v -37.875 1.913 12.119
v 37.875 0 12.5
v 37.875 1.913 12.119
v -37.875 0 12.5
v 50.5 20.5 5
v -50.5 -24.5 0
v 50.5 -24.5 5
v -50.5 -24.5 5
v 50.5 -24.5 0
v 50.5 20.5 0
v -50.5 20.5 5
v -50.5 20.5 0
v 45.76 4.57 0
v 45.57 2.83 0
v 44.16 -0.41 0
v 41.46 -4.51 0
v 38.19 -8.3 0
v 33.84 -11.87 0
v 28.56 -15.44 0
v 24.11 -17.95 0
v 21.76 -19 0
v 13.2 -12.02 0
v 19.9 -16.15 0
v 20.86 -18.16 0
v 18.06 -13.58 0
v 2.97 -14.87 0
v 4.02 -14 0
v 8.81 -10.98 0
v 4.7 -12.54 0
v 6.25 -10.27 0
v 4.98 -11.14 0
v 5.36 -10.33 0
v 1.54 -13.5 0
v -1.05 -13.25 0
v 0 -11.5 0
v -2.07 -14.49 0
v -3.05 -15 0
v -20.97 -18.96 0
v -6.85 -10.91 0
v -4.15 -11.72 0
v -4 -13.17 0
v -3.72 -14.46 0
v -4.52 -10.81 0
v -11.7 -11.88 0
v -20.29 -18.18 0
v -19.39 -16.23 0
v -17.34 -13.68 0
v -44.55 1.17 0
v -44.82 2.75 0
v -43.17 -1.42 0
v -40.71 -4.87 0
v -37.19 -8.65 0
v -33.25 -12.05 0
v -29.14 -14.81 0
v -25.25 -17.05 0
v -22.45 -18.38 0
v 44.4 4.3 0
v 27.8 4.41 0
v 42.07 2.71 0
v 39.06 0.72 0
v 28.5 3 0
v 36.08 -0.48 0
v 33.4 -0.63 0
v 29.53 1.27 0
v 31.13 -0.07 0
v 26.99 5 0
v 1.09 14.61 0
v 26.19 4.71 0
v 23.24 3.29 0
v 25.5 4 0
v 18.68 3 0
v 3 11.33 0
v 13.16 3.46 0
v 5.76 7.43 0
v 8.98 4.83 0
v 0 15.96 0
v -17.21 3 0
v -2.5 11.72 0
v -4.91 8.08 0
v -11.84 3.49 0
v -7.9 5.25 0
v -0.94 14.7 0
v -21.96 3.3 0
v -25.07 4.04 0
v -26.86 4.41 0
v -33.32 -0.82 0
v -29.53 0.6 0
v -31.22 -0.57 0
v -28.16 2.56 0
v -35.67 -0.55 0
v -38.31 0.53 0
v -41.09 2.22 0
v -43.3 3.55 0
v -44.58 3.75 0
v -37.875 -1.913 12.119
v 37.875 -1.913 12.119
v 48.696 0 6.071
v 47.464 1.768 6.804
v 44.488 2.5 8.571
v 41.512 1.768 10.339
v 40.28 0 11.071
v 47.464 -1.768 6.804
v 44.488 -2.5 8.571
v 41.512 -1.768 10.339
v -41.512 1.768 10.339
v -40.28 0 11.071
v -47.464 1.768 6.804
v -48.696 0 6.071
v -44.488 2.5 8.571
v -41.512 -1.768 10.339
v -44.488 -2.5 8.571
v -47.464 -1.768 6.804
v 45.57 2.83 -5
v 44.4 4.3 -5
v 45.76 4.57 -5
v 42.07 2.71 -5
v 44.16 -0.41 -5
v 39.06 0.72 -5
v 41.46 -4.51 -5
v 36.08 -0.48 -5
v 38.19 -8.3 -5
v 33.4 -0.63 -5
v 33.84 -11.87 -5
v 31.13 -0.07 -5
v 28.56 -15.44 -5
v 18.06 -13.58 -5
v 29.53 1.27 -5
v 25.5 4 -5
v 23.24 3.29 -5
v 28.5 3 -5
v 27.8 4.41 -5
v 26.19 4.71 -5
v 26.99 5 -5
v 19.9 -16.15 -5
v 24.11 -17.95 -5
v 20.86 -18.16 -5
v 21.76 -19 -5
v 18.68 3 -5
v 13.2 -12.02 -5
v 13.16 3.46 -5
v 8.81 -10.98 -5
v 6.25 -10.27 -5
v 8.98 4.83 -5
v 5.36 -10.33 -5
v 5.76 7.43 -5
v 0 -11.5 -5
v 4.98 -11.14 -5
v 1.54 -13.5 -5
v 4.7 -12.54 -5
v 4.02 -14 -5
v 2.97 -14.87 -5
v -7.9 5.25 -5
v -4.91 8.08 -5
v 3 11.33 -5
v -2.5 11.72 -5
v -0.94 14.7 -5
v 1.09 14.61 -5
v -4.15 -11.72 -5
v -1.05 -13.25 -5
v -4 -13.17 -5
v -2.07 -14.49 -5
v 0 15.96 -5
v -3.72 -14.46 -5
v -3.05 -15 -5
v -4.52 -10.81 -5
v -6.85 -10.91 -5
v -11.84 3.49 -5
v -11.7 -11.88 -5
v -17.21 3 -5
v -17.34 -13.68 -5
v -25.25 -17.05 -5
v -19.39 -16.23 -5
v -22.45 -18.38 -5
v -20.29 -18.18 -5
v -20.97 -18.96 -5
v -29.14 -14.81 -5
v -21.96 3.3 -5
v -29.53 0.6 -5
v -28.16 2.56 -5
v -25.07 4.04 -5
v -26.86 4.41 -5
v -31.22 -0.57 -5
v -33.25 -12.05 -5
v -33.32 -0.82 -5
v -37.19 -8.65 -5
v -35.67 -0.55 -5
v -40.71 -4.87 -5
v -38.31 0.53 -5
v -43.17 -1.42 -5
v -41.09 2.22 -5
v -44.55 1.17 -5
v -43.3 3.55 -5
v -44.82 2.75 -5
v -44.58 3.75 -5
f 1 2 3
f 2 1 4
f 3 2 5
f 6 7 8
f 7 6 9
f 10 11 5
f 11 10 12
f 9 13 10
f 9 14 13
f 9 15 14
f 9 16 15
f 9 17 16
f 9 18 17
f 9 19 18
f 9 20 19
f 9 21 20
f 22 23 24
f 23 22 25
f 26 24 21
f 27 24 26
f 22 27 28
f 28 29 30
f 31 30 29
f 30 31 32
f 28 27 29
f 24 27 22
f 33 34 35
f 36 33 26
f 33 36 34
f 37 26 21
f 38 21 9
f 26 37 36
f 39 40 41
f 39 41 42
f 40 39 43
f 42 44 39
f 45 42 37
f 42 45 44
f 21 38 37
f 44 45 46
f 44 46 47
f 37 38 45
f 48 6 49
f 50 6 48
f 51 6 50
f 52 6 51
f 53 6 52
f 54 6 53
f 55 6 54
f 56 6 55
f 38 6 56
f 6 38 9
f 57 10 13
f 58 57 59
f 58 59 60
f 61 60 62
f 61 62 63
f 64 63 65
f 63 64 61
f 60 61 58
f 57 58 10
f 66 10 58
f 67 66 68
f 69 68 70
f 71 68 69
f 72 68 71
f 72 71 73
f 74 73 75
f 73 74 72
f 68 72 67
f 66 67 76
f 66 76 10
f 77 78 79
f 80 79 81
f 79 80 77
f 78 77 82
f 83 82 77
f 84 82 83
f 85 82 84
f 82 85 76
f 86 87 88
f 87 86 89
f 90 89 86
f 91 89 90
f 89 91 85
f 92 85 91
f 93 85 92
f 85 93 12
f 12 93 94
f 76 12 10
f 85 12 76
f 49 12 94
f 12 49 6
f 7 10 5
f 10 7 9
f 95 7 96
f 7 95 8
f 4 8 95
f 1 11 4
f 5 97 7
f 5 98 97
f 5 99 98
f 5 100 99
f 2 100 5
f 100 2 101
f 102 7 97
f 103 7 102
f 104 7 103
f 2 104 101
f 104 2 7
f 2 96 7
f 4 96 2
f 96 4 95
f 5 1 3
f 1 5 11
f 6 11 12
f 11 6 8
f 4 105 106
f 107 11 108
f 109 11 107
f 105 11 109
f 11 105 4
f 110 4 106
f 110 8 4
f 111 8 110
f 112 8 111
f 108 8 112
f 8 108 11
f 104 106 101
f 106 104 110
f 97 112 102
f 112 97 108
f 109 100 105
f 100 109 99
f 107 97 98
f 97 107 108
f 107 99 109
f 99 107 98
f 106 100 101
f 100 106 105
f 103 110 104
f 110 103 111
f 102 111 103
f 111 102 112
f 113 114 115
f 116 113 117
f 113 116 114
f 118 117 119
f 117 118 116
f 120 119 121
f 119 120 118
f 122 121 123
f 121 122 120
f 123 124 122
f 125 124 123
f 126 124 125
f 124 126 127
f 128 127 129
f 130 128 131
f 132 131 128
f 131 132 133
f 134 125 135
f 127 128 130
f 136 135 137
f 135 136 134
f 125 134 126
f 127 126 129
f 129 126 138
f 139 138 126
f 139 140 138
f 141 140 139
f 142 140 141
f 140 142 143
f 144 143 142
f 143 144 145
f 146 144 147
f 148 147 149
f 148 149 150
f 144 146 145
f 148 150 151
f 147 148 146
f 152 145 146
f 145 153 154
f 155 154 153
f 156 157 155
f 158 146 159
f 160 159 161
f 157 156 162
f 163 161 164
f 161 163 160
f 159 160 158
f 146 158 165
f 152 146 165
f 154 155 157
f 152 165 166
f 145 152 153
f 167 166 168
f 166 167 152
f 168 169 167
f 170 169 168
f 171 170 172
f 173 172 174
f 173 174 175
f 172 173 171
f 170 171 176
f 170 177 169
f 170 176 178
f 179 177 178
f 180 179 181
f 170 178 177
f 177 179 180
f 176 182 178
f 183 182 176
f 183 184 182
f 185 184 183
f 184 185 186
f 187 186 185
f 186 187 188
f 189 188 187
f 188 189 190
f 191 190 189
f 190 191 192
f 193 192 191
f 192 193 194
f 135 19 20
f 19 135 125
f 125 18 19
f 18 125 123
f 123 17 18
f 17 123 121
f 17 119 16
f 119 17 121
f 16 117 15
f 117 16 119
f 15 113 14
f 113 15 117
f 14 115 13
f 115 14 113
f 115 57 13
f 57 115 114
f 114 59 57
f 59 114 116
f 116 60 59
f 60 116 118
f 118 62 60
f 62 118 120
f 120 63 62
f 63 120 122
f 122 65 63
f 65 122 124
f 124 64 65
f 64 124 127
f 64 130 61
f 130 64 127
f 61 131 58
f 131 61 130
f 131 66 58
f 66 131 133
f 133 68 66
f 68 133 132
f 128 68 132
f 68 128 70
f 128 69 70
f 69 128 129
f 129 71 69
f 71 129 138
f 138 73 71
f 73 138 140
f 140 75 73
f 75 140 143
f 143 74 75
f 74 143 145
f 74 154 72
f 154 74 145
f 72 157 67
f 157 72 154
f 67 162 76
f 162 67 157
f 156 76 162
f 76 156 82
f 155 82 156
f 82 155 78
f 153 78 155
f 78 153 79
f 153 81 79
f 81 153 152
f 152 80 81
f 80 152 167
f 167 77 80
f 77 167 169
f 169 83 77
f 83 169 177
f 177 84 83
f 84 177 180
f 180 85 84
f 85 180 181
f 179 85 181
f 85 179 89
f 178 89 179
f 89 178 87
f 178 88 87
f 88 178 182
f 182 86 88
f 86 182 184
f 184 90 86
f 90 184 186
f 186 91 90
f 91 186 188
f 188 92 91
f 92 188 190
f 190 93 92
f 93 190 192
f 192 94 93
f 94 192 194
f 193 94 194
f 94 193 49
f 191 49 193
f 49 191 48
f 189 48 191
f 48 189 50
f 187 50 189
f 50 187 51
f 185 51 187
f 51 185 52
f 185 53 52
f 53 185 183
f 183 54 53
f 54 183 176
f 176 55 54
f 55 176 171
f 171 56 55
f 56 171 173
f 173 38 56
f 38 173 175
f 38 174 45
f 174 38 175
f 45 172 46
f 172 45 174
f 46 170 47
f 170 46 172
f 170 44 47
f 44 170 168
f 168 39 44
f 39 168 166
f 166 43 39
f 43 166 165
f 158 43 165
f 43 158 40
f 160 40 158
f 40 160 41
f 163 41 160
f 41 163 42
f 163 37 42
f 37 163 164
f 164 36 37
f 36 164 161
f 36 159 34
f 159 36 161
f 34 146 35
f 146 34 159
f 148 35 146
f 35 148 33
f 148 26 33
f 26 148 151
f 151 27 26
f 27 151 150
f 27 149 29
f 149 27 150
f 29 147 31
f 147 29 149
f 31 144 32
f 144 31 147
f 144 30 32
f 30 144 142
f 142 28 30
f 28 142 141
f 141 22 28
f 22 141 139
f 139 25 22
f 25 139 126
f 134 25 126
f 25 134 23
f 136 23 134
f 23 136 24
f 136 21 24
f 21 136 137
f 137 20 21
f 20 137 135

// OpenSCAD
//input from http://chaaawa.com/stencil_factory_js/
input = "no_input";
//The size of the border arround the image (0 is no boarder)
boarder = 0; //[100]
//how much extra to add to the base shape, to allow for pointy or unusual images
comp_size = 10;//[100]
//xposition compensation
xcomp=0;
//yposition compensation
ycomp=-2;
//size of lace loop
loop_size = 5;
//the shape of the badge (including boarder)
shape = 0 ;// [180:Round, 360:Smooth, 4:Diamond, 5:Pentagon, 6:Hexagon, 7:Heptagon, 8:Octagon, 9:Nonagon, 10:Decagon, 11:Hendecagon, 12:Dodecagon,0:Square]

points_array = (input=="no_input"?  [[91,35],[[179.03,131.04],[177.55,131.62],[174.75,132.95],[170.86,135.19],[166.75,137.95],[162.81,141.35],[159.29,145.13],[156.83,148.58],[155.45,151.17],[155.18,152.75],[155.42,153.75],[156.7,153.55],[158.91,152.22],[161.69,150.53],[164.33,149.45],[166.68,149.18],[168.78,149.43],[170.47,150.6],[171.84,152.56],[173.14,154.41],[174.93,154.04],[178.04,153.3],[182.79,153],[188.16,153.49],[192.1,155.25],[195.09,158.08],[197.5,161.72],[199.06,164.7],[200,165.96],[201.09,164.61],[203,161.33],[205.76,157.43],[208.98,154.83],[213.16,153.46],[218.68,153],[223.24,153.29],[225.5,154],[226.19,154.71],[226.99,155],[227.8,154.41],[228.5,153],[229.53,151.27],[231.13,149.93],[233.4,149.37],[236.08,149.52],[239.06,150.72],[242.07,152.71],[244.4,154.3],[245.76,154.57],[245.57,152.83],[244.16,149.59],[241.46,145.49],[238.19,141.7],[233.84,138.13],[228.56,134.56],[224.11,132.05],[221.76,131],[220.86,131.84],[219.9,133.85],[218.06,136.42],[213.2,137.98],[208.81,139.02],[206.25,139.73],[205.36,139.67],[204.98,138.86],[204.7,137.46],[204.02,136],[202.97,135.13],[201.54,136.5],[200,138.5],[198.95,136.75],[197.93,135.51],[196.95,135],[196.28,135.54],[196,136.83],[195.85,138.28],[195.48,139.19],[193.15,139.09],[188.3,138.12],[182.66,136.32],[180.61,133.77],[179.71,131.82],[179.03,131.04]]]: input);

dispo_width = boarder*2;
badge_height = 10;
  
module logo(){
    translate([-400/2, -300/2, -badge_height/2]){
        for (i = [1:len(points_array) -1] ) {
            linear_extrude(height=badge_height/2)
            {
                polygon(points_array[i]);
            }
        }
    }
}

module back(){
    swidth = input_width+comp_size+boarder;
    sheight = input_height+comp_size+boarder;
    if (shape!= 0){
        translate([xcomp,xcomp,0]){
            scale([swidth,sheight,1]){
                cylinder(d=1,h=badge_height/2,$fn=shape);
            }
        }
    } else {
        translate([xcomp,ycomp,badge_height/4]){
            cube([swidth,sheight,badge_height/2],center=true);
        }
    }
}
module loop(){
    swidth = input_width+comp_size;
    translate([0,0,(badge_height+loop_size)/2]){
        rotate([0,90,0]){
            cylinder(d=loop_size+5,h=swidth*0.75, center=true);
        }
    }
}
module add_boarder(){
    swidth = input_width+comp_size;
    sheight = input_height+comp_size;
    
    if (shape!= 0){
        translate([xcomp,xcomp,-badge_height/2]){
            difference(){
                scale([swidth+boarder,sheight+boarder,1]){
                    cylinder(d=1,h=badge_height/2,$fn=shape);
                }
                scale([swidth,sheight,1]){
                    cylinder(d=1,h=badge_height/2,$fn=shape);
                }
            }
        }
    } else {
        translate([xcomp,ycomp,-badge_height/4]){
            difference(){
                cube([swidth+boarder,sheight+boarder,badge_height/2],center=true);
                cube([swidth,sheight,badge_height/2],center=true);
            }
        }
    }
}

module badge(){
    color("gray"){
        logo();
    }
    difference(){   
        hull(){
            back();
            loop();
        }
        translate([0,0,(badge_height+loop_size)/1.75]){
            rotate([0,90,0]){
                cylinder(d=loop_size,h=(input_width+comp_size)*2, center=true);
            }
        }
    }
    if (boarder>0){
        add_boarder();
    }
}
input_width = points_array[0][0];
input_height= points_array[0][1];
badge();
